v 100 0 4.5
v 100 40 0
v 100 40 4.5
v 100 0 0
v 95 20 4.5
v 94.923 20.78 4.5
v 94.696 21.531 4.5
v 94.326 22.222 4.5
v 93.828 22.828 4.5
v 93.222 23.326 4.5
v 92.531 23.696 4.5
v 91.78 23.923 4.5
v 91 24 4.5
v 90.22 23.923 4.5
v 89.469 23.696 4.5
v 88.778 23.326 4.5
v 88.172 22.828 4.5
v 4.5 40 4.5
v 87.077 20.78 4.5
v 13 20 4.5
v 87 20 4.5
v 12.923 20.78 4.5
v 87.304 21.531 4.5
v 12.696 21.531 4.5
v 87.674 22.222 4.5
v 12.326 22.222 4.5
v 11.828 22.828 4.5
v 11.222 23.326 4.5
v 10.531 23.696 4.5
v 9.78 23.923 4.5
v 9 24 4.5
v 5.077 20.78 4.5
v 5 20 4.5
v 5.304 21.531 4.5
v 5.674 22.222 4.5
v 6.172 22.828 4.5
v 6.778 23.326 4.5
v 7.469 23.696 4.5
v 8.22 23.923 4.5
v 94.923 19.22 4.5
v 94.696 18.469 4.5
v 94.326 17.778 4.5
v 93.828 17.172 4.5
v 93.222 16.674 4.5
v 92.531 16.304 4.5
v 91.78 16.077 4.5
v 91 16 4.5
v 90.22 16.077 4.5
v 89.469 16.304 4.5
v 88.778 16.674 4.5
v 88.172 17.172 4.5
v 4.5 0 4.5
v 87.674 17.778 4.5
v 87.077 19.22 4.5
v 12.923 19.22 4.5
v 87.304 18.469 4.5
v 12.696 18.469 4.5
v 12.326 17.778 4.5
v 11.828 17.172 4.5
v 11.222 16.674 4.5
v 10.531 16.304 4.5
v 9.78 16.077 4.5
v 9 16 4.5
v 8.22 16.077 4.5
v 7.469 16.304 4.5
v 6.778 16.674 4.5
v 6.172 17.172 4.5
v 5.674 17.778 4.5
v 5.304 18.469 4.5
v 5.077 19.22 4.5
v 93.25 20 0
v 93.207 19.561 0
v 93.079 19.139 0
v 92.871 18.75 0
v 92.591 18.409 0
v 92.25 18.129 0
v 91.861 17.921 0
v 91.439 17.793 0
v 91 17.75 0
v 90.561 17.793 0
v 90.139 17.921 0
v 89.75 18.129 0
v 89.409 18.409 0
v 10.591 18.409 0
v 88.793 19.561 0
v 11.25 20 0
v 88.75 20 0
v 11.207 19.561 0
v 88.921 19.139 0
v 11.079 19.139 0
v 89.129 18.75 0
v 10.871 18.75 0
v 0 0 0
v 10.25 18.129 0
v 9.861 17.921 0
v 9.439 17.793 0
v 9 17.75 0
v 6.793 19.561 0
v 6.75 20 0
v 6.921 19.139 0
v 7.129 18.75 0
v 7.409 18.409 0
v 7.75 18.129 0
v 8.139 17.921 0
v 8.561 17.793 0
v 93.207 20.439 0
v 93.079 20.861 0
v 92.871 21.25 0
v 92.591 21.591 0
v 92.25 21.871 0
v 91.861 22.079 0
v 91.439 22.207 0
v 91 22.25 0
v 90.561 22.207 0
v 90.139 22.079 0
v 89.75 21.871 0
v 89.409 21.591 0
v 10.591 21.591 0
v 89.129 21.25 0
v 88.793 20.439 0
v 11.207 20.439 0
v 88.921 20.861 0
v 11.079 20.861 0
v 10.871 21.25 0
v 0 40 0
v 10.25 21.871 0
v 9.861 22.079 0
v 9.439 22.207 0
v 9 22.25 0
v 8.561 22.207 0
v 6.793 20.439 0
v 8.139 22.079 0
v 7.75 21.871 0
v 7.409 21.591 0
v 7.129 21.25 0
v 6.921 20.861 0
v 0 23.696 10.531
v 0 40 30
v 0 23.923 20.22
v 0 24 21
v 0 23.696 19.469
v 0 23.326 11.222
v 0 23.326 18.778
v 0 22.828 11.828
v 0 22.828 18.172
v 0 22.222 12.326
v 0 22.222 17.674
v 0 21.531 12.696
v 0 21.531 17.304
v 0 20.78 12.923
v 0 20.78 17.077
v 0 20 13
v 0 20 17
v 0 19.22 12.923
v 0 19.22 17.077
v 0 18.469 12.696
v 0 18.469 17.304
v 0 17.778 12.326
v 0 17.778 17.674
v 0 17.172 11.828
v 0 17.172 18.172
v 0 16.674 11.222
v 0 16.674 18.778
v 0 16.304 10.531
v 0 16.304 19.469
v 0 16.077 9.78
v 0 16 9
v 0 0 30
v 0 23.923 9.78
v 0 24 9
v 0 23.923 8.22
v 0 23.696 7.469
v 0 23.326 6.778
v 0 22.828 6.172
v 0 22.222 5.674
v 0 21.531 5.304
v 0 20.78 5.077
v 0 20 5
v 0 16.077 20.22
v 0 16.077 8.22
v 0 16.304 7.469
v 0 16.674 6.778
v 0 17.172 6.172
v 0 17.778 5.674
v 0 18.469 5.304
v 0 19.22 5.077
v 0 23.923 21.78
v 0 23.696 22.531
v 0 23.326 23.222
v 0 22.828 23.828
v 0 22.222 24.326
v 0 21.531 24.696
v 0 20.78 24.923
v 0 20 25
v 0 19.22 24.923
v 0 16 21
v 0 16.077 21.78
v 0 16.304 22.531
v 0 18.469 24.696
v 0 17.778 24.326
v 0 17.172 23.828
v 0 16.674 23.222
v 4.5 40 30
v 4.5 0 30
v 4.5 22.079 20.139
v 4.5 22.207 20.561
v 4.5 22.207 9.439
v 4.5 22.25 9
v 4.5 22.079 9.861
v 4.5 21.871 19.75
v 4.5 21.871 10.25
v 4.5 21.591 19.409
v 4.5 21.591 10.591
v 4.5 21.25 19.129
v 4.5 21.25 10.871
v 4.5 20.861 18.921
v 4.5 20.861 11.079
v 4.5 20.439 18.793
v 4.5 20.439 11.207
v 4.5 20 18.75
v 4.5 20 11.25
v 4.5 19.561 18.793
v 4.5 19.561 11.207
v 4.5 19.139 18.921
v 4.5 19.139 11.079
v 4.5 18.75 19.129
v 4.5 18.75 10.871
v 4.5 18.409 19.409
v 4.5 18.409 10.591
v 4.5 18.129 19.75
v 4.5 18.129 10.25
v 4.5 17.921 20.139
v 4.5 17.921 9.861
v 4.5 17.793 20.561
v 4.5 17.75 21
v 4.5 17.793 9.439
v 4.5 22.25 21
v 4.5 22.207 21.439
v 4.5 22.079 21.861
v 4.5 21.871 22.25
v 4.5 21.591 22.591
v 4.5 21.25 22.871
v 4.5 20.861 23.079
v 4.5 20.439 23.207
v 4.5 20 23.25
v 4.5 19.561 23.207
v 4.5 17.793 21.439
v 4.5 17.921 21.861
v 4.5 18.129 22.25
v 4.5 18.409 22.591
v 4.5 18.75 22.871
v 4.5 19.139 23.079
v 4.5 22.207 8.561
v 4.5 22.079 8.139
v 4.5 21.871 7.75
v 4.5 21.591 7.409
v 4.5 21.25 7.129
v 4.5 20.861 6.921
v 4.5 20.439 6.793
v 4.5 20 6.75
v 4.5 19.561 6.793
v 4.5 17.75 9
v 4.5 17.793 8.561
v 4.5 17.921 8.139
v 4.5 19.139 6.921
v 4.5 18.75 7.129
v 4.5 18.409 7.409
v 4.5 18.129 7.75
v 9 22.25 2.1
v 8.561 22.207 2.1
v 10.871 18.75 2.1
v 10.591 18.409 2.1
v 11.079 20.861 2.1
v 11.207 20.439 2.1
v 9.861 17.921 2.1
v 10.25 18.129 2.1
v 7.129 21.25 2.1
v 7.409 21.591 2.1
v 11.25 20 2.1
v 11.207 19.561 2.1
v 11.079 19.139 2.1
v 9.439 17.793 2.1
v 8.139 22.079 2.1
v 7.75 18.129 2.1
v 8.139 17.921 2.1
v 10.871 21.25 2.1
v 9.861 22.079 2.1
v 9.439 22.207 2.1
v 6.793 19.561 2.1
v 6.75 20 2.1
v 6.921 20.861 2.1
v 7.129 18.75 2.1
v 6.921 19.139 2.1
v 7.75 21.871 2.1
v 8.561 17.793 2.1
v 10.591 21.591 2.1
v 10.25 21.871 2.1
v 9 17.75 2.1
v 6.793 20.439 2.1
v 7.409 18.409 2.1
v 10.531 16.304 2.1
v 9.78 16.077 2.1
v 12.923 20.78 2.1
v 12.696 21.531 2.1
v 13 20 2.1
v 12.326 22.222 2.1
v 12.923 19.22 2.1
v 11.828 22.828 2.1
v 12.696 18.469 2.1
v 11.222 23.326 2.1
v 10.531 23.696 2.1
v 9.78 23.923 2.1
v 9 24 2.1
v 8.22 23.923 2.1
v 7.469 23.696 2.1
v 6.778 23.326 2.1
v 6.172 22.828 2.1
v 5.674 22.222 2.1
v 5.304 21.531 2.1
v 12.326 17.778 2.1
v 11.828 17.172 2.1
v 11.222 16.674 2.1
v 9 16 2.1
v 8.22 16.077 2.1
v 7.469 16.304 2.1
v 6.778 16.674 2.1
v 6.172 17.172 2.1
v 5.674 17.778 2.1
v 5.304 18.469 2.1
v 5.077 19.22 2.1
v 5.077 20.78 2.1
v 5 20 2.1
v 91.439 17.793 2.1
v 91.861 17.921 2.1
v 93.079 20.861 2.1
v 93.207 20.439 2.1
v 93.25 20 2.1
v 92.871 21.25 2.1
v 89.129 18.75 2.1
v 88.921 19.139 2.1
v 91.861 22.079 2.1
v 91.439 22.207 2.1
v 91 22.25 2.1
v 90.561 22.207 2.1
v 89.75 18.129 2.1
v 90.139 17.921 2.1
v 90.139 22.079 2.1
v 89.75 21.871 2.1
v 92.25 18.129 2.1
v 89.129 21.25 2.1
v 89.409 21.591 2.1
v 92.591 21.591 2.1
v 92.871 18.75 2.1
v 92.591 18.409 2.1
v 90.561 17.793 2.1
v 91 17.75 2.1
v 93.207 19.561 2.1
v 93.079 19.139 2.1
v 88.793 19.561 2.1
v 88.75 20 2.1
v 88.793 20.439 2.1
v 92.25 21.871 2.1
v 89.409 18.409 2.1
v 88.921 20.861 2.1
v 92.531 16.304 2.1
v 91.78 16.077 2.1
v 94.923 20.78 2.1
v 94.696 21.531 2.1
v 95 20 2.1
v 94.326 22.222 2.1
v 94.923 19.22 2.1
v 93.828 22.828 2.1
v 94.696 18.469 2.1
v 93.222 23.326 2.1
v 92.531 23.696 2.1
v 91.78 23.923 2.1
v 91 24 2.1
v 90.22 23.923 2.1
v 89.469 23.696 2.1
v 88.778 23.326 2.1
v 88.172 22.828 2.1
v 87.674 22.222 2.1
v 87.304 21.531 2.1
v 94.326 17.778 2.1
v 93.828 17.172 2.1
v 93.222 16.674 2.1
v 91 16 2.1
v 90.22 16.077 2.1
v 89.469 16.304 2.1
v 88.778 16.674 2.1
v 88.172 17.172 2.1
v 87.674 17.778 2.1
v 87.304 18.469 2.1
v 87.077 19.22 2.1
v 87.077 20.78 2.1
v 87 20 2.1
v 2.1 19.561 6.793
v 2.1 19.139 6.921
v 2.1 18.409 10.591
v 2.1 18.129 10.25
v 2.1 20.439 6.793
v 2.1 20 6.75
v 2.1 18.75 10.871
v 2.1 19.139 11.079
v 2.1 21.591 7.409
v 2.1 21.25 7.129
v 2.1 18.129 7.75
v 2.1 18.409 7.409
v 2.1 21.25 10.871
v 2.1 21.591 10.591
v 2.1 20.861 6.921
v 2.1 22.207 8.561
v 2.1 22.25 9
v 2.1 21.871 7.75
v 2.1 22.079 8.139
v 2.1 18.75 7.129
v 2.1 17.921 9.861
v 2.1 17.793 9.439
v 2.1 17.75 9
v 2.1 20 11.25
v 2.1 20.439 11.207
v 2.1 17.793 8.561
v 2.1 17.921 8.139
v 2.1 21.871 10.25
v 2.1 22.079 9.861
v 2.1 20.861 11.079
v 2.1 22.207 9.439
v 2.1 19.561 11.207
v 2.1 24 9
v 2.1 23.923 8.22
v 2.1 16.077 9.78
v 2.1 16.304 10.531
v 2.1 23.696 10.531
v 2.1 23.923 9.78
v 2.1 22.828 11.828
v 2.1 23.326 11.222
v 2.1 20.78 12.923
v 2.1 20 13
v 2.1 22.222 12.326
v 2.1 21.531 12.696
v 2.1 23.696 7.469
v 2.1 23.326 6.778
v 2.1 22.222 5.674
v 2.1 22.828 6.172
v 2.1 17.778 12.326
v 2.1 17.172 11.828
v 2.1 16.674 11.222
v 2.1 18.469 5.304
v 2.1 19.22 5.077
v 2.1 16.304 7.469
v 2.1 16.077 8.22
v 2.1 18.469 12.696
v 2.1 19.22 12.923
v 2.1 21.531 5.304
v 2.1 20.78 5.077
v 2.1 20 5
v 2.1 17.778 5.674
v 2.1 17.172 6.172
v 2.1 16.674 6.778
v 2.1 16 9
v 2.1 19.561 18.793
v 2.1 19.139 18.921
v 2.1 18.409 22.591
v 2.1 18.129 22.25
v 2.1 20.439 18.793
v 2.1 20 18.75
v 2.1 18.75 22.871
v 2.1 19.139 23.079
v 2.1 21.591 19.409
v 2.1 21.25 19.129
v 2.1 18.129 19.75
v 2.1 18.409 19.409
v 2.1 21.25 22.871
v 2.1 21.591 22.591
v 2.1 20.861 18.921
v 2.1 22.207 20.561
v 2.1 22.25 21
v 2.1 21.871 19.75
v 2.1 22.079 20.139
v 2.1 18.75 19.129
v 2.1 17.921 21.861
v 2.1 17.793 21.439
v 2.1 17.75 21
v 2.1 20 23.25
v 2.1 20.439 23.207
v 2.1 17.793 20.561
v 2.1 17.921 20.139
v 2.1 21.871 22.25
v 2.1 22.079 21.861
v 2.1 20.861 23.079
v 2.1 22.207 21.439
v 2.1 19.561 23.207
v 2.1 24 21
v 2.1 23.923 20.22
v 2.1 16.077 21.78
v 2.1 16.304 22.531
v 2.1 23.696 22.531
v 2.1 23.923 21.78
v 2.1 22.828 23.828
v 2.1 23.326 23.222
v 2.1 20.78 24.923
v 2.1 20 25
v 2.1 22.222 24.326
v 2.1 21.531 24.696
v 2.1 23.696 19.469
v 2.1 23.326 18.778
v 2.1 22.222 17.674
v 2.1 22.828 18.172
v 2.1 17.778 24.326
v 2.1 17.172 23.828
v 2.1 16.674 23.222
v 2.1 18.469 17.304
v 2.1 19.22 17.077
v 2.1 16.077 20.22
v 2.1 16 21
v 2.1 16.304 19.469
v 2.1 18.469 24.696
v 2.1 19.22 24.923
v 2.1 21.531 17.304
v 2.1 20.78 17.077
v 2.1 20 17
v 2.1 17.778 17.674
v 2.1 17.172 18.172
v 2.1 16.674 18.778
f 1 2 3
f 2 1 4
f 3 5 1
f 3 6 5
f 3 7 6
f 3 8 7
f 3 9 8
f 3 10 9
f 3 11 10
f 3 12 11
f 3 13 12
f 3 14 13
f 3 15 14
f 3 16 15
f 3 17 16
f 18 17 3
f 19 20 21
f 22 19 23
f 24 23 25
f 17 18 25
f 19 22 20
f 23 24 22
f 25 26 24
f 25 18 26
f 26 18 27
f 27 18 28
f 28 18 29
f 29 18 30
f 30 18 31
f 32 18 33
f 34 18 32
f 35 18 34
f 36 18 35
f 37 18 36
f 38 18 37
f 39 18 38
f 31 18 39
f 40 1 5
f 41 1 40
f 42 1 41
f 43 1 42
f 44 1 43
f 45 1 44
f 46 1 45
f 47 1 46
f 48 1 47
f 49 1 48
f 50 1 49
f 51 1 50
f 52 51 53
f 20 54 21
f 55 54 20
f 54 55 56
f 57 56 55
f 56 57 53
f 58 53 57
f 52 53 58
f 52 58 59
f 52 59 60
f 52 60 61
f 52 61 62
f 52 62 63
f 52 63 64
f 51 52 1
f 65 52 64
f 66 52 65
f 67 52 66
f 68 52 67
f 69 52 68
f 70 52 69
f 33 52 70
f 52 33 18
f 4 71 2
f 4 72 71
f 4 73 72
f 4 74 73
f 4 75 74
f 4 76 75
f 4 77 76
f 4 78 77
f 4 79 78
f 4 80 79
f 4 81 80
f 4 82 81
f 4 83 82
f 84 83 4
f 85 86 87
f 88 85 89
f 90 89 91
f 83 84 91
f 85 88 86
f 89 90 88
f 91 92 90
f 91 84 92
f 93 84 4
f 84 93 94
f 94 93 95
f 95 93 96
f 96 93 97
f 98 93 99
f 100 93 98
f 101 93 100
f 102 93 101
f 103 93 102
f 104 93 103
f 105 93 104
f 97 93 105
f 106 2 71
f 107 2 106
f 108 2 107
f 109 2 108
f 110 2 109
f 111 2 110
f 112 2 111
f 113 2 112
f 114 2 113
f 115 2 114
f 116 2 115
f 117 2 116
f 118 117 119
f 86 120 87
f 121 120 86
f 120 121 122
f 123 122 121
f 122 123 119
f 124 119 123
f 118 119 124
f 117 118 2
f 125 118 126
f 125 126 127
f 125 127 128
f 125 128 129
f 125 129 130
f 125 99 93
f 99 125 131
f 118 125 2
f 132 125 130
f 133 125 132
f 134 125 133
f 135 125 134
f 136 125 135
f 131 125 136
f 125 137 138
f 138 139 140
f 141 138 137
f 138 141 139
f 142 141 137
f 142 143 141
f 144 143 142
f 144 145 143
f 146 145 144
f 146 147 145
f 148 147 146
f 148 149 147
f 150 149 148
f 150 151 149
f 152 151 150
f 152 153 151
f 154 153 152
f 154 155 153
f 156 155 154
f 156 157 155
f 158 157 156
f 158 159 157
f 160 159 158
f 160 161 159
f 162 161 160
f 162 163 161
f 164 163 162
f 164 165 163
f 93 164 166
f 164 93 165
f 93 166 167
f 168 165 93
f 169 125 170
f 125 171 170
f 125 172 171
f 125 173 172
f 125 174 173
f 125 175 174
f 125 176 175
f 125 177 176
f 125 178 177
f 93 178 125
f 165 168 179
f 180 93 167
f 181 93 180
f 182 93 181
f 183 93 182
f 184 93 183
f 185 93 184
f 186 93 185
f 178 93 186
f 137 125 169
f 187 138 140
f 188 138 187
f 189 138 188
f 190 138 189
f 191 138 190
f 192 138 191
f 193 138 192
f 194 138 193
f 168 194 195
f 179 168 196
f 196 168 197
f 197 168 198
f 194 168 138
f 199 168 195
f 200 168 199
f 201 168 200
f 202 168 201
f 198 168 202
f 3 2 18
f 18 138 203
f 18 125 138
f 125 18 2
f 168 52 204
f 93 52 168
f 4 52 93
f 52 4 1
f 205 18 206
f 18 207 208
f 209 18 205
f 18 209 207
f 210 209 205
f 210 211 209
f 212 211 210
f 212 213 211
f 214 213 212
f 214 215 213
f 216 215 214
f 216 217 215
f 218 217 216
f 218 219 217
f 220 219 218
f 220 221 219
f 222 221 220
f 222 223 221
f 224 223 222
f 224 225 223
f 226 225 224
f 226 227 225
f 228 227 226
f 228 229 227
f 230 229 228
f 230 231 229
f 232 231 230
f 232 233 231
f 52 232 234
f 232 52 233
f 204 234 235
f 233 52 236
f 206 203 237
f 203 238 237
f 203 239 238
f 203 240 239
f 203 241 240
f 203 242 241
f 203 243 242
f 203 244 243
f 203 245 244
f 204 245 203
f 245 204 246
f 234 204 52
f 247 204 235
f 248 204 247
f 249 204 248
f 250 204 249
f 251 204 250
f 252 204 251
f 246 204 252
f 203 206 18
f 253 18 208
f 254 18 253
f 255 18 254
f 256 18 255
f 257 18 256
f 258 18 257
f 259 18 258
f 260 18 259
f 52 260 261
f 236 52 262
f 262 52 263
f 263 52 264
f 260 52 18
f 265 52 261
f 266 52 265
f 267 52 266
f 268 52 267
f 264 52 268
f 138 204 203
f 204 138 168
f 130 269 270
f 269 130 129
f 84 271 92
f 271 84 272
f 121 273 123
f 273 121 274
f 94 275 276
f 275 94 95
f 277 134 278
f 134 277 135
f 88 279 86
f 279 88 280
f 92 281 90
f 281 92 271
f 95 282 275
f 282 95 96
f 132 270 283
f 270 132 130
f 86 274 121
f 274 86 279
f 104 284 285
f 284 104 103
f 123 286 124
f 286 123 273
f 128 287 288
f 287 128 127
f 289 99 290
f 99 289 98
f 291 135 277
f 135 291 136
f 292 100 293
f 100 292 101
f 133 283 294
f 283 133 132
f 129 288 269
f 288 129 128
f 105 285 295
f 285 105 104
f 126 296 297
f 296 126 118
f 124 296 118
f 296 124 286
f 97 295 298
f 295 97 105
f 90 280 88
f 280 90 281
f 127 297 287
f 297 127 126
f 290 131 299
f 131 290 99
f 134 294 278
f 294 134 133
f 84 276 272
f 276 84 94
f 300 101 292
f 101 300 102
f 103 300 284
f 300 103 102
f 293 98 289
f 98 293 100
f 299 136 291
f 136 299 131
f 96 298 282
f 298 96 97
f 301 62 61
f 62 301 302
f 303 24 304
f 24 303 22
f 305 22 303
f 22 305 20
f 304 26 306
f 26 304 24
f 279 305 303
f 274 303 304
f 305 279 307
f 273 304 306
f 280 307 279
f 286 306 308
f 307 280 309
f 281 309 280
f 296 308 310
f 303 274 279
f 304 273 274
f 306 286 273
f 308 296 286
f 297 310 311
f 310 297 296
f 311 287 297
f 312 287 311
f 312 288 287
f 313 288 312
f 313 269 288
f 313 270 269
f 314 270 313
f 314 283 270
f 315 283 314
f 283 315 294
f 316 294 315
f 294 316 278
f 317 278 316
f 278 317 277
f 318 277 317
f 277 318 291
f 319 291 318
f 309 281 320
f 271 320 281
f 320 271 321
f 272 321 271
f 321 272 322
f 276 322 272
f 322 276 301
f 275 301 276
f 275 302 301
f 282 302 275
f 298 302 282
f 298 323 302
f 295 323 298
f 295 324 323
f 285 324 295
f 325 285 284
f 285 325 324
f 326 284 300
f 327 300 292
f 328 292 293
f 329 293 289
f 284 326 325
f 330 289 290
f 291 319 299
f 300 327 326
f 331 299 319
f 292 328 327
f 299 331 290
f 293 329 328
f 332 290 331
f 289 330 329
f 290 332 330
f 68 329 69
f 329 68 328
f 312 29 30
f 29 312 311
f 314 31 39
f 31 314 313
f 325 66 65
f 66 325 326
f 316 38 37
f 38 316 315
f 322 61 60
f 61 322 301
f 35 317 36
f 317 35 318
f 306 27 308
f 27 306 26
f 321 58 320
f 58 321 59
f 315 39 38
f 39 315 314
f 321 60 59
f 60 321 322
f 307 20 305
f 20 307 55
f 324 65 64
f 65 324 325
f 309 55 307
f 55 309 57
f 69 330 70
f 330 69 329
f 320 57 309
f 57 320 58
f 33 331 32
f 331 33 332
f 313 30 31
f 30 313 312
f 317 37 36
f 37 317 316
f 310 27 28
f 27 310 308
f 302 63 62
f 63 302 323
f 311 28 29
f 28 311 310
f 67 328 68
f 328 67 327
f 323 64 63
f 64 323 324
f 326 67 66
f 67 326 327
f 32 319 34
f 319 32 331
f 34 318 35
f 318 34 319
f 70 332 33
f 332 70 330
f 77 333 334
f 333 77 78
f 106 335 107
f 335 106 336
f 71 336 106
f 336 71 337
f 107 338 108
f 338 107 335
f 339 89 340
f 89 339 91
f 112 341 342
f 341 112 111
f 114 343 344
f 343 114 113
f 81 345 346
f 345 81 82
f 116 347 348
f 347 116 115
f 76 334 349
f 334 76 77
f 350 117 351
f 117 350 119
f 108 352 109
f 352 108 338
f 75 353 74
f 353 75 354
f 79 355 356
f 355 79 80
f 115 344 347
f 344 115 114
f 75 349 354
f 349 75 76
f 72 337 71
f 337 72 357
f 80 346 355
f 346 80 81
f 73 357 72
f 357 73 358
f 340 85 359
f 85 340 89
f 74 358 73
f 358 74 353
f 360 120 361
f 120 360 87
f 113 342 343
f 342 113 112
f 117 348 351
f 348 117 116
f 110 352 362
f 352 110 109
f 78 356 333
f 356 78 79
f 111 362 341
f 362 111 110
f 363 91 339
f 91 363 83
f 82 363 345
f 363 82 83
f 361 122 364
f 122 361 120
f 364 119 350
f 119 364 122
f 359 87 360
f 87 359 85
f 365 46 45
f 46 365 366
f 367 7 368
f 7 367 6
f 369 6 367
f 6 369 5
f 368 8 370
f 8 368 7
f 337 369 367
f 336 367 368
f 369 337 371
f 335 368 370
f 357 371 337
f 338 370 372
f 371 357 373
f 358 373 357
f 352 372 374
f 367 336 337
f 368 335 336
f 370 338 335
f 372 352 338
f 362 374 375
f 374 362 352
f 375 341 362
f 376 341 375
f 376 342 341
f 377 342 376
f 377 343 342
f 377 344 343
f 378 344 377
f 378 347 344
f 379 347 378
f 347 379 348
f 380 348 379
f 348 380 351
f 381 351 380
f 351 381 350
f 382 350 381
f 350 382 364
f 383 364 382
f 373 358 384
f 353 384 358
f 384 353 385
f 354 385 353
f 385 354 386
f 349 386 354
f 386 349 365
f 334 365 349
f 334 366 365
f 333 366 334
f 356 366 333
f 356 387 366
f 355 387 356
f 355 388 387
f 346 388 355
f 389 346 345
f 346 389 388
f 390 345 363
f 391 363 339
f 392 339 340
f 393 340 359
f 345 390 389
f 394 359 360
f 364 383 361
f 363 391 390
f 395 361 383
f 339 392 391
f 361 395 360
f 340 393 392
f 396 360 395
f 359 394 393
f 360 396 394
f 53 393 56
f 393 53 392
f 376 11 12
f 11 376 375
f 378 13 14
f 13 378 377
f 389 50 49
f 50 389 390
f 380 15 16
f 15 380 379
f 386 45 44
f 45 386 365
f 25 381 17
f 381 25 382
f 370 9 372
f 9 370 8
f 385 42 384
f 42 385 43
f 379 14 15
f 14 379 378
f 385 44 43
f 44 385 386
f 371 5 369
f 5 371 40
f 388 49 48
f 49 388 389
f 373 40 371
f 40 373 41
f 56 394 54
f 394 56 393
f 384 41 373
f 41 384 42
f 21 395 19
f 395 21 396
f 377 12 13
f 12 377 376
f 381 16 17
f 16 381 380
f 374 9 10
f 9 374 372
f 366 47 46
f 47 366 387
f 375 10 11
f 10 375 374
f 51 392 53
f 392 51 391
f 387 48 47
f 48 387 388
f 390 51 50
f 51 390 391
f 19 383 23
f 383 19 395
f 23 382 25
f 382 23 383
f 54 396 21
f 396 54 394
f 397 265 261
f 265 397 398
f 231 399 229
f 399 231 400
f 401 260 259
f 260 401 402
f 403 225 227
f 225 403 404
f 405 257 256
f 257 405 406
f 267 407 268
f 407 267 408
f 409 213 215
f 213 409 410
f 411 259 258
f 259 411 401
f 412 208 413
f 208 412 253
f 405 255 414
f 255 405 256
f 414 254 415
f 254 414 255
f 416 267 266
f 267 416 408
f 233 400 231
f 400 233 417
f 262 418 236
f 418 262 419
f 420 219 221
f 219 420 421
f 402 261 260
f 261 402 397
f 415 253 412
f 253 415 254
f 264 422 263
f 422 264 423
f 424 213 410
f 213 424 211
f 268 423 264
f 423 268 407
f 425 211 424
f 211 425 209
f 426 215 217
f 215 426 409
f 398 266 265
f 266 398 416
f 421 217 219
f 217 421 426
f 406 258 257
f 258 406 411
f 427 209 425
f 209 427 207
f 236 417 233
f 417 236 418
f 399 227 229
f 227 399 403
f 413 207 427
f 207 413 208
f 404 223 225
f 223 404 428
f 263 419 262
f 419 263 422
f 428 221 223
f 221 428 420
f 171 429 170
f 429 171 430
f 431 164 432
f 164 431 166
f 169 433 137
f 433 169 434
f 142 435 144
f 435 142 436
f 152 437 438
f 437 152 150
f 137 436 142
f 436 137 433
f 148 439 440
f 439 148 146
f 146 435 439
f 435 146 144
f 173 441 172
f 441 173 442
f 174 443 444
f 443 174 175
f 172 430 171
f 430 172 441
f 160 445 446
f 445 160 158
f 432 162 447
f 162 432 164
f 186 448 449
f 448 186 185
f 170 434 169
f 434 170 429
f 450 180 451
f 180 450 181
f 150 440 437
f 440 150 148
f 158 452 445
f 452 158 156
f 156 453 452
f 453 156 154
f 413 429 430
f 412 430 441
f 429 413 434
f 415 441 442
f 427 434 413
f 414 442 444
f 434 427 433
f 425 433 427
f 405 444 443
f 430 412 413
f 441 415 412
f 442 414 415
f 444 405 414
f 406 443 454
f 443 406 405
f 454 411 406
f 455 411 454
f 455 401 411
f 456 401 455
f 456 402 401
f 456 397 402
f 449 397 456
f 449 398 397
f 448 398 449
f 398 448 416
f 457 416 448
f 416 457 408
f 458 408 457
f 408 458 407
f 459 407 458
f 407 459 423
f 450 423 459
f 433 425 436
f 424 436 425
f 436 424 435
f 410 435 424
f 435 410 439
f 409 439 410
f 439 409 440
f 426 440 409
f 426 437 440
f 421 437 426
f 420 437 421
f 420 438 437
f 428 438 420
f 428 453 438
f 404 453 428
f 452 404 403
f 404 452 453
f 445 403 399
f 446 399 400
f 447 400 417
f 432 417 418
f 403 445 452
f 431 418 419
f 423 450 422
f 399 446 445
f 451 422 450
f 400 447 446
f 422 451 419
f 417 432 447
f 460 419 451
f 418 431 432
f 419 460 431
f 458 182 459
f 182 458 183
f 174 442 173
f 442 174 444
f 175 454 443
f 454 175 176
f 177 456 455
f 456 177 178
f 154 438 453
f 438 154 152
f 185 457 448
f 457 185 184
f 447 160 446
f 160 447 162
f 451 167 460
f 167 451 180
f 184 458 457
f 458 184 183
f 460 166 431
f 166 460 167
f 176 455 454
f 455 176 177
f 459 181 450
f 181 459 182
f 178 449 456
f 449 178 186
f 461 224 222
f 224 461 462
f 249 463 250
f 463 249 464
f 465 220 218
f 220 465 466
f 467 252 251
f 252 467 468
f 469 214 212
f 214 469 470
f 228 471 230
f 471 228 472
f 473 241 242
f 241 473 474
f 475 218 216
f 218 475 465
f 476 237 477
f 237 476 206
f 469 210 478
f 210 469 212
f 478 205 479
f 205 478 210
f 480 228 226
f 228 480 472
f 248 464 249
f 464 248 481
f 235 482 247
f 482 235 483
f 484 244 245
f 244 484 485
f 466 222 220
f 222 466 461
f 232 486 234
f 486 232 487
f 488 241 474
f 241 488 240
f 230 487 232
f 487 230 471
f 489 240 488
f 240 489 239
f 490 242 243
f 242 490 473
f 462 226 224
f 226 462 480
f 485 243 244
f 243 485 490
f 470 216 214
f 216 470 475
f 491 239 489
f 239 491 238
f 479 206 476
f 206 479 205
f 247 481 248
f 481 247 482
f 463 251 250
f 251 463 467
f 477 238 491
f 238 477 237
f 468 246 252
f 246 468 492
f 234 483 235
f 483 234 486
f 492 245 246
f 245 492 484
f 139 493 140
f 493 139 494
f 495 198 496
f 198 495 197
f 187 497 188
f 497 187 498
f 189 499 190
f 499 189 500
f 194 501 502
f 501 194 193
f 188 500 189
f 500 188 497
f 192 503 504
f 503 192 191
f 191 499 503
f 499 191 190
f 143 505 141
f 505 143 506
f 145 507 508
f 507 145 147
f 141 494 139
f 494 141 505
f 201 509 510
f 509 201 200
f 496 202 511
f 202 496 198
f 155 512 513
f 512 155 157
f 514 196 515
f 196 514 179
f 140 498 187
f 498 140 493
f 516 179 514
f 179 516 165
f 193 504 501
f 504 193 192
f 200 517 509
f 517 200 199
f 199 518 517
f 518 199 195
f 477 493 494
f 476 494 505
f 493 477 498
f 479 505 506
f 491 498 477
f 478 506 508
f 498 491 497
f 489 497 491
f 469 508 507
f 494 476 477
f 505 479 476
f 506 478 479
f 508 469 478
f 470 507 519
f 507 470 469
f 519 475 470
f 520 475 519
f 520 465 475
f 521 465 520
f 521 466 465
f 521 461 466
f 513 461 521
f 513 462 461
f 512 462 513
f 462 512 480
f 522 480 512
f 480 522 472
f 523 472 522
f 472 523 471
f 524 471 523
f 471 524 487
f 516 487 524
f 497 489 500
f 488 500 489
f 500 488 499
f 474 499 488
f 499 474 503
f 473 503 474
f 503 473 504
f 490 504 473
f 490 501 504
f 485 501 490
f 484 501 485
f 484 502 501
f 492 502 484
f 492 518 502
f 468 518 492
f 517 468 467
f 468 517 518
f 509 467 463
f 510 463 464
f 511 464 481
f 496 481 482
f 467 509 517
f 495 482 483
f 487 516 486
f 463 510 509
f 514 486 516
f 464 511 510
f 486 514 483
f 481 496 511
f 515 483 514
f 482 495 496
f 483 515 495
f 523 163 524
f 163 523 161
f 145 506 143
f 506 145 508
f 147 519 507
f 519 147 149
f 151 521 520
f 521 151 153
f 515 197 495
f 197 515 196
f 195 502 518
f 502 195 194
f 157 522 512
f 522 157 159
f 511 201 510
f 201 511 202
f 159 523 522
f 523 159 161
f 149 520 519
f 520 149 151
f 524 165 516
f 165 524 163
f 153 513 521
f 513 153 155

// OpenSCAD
$fn = 32;

// ----------------------------------------------------------------------
// L-bracket: 100 x 40 x 30 mm
// ----------------------------------------------------------------------

// --- parameters (mm) ---
run_out = 100;            // horizontal leg, X
rise = 30;                // vertical leg, Z
bracket_w = 40;           // bracket depth, Y
sheet_t = 4.5;            // plate thickness
hole_d = 4.5;             // clearance for M4
cb_d = 8;                 // counterbore seat
cb_h = 2.4;               // counterbore depth

module hole_z(px, py) {
  translate([px, py, -0.5]) cylinder(h = sheet_t + 1, d = hole_d);
}
module hole_x(pz, py) {
  translate([-0.5, py, pz]) rotate([0, 90, 0]) cylinder(h = sheet_t + 1, d = hole_d);
}
module cb_z(px, py) {
  translate([px, py, sheet_t - cb_h]) cylinder(h = cb_h + 0.4, d = cb_d);
}
module cb_x(pz, py) {
  translate([sheet_t - cb_h, py, pz]) rotate([0, -90, 0]) cylinder(h = cb_h + 0.4, d = cb_d);
}

difference() {
  union() {
    /* horizontal leg */
    cube([run_out, bracket_w, sheet_t]);
    /* vertical leg, overlapping the corner block */
    cube([sheet_t, bracket_w, rise]);
  }
  hole_z(9, 20);
  cb_z(9, 20);
  hole_z(91, 20);
  cb_z(91, 20);
  hole_x(9, 20);
  cb_x(9, 20);
  hole_x(21, 20);
  cb_x(21, 20);
}
